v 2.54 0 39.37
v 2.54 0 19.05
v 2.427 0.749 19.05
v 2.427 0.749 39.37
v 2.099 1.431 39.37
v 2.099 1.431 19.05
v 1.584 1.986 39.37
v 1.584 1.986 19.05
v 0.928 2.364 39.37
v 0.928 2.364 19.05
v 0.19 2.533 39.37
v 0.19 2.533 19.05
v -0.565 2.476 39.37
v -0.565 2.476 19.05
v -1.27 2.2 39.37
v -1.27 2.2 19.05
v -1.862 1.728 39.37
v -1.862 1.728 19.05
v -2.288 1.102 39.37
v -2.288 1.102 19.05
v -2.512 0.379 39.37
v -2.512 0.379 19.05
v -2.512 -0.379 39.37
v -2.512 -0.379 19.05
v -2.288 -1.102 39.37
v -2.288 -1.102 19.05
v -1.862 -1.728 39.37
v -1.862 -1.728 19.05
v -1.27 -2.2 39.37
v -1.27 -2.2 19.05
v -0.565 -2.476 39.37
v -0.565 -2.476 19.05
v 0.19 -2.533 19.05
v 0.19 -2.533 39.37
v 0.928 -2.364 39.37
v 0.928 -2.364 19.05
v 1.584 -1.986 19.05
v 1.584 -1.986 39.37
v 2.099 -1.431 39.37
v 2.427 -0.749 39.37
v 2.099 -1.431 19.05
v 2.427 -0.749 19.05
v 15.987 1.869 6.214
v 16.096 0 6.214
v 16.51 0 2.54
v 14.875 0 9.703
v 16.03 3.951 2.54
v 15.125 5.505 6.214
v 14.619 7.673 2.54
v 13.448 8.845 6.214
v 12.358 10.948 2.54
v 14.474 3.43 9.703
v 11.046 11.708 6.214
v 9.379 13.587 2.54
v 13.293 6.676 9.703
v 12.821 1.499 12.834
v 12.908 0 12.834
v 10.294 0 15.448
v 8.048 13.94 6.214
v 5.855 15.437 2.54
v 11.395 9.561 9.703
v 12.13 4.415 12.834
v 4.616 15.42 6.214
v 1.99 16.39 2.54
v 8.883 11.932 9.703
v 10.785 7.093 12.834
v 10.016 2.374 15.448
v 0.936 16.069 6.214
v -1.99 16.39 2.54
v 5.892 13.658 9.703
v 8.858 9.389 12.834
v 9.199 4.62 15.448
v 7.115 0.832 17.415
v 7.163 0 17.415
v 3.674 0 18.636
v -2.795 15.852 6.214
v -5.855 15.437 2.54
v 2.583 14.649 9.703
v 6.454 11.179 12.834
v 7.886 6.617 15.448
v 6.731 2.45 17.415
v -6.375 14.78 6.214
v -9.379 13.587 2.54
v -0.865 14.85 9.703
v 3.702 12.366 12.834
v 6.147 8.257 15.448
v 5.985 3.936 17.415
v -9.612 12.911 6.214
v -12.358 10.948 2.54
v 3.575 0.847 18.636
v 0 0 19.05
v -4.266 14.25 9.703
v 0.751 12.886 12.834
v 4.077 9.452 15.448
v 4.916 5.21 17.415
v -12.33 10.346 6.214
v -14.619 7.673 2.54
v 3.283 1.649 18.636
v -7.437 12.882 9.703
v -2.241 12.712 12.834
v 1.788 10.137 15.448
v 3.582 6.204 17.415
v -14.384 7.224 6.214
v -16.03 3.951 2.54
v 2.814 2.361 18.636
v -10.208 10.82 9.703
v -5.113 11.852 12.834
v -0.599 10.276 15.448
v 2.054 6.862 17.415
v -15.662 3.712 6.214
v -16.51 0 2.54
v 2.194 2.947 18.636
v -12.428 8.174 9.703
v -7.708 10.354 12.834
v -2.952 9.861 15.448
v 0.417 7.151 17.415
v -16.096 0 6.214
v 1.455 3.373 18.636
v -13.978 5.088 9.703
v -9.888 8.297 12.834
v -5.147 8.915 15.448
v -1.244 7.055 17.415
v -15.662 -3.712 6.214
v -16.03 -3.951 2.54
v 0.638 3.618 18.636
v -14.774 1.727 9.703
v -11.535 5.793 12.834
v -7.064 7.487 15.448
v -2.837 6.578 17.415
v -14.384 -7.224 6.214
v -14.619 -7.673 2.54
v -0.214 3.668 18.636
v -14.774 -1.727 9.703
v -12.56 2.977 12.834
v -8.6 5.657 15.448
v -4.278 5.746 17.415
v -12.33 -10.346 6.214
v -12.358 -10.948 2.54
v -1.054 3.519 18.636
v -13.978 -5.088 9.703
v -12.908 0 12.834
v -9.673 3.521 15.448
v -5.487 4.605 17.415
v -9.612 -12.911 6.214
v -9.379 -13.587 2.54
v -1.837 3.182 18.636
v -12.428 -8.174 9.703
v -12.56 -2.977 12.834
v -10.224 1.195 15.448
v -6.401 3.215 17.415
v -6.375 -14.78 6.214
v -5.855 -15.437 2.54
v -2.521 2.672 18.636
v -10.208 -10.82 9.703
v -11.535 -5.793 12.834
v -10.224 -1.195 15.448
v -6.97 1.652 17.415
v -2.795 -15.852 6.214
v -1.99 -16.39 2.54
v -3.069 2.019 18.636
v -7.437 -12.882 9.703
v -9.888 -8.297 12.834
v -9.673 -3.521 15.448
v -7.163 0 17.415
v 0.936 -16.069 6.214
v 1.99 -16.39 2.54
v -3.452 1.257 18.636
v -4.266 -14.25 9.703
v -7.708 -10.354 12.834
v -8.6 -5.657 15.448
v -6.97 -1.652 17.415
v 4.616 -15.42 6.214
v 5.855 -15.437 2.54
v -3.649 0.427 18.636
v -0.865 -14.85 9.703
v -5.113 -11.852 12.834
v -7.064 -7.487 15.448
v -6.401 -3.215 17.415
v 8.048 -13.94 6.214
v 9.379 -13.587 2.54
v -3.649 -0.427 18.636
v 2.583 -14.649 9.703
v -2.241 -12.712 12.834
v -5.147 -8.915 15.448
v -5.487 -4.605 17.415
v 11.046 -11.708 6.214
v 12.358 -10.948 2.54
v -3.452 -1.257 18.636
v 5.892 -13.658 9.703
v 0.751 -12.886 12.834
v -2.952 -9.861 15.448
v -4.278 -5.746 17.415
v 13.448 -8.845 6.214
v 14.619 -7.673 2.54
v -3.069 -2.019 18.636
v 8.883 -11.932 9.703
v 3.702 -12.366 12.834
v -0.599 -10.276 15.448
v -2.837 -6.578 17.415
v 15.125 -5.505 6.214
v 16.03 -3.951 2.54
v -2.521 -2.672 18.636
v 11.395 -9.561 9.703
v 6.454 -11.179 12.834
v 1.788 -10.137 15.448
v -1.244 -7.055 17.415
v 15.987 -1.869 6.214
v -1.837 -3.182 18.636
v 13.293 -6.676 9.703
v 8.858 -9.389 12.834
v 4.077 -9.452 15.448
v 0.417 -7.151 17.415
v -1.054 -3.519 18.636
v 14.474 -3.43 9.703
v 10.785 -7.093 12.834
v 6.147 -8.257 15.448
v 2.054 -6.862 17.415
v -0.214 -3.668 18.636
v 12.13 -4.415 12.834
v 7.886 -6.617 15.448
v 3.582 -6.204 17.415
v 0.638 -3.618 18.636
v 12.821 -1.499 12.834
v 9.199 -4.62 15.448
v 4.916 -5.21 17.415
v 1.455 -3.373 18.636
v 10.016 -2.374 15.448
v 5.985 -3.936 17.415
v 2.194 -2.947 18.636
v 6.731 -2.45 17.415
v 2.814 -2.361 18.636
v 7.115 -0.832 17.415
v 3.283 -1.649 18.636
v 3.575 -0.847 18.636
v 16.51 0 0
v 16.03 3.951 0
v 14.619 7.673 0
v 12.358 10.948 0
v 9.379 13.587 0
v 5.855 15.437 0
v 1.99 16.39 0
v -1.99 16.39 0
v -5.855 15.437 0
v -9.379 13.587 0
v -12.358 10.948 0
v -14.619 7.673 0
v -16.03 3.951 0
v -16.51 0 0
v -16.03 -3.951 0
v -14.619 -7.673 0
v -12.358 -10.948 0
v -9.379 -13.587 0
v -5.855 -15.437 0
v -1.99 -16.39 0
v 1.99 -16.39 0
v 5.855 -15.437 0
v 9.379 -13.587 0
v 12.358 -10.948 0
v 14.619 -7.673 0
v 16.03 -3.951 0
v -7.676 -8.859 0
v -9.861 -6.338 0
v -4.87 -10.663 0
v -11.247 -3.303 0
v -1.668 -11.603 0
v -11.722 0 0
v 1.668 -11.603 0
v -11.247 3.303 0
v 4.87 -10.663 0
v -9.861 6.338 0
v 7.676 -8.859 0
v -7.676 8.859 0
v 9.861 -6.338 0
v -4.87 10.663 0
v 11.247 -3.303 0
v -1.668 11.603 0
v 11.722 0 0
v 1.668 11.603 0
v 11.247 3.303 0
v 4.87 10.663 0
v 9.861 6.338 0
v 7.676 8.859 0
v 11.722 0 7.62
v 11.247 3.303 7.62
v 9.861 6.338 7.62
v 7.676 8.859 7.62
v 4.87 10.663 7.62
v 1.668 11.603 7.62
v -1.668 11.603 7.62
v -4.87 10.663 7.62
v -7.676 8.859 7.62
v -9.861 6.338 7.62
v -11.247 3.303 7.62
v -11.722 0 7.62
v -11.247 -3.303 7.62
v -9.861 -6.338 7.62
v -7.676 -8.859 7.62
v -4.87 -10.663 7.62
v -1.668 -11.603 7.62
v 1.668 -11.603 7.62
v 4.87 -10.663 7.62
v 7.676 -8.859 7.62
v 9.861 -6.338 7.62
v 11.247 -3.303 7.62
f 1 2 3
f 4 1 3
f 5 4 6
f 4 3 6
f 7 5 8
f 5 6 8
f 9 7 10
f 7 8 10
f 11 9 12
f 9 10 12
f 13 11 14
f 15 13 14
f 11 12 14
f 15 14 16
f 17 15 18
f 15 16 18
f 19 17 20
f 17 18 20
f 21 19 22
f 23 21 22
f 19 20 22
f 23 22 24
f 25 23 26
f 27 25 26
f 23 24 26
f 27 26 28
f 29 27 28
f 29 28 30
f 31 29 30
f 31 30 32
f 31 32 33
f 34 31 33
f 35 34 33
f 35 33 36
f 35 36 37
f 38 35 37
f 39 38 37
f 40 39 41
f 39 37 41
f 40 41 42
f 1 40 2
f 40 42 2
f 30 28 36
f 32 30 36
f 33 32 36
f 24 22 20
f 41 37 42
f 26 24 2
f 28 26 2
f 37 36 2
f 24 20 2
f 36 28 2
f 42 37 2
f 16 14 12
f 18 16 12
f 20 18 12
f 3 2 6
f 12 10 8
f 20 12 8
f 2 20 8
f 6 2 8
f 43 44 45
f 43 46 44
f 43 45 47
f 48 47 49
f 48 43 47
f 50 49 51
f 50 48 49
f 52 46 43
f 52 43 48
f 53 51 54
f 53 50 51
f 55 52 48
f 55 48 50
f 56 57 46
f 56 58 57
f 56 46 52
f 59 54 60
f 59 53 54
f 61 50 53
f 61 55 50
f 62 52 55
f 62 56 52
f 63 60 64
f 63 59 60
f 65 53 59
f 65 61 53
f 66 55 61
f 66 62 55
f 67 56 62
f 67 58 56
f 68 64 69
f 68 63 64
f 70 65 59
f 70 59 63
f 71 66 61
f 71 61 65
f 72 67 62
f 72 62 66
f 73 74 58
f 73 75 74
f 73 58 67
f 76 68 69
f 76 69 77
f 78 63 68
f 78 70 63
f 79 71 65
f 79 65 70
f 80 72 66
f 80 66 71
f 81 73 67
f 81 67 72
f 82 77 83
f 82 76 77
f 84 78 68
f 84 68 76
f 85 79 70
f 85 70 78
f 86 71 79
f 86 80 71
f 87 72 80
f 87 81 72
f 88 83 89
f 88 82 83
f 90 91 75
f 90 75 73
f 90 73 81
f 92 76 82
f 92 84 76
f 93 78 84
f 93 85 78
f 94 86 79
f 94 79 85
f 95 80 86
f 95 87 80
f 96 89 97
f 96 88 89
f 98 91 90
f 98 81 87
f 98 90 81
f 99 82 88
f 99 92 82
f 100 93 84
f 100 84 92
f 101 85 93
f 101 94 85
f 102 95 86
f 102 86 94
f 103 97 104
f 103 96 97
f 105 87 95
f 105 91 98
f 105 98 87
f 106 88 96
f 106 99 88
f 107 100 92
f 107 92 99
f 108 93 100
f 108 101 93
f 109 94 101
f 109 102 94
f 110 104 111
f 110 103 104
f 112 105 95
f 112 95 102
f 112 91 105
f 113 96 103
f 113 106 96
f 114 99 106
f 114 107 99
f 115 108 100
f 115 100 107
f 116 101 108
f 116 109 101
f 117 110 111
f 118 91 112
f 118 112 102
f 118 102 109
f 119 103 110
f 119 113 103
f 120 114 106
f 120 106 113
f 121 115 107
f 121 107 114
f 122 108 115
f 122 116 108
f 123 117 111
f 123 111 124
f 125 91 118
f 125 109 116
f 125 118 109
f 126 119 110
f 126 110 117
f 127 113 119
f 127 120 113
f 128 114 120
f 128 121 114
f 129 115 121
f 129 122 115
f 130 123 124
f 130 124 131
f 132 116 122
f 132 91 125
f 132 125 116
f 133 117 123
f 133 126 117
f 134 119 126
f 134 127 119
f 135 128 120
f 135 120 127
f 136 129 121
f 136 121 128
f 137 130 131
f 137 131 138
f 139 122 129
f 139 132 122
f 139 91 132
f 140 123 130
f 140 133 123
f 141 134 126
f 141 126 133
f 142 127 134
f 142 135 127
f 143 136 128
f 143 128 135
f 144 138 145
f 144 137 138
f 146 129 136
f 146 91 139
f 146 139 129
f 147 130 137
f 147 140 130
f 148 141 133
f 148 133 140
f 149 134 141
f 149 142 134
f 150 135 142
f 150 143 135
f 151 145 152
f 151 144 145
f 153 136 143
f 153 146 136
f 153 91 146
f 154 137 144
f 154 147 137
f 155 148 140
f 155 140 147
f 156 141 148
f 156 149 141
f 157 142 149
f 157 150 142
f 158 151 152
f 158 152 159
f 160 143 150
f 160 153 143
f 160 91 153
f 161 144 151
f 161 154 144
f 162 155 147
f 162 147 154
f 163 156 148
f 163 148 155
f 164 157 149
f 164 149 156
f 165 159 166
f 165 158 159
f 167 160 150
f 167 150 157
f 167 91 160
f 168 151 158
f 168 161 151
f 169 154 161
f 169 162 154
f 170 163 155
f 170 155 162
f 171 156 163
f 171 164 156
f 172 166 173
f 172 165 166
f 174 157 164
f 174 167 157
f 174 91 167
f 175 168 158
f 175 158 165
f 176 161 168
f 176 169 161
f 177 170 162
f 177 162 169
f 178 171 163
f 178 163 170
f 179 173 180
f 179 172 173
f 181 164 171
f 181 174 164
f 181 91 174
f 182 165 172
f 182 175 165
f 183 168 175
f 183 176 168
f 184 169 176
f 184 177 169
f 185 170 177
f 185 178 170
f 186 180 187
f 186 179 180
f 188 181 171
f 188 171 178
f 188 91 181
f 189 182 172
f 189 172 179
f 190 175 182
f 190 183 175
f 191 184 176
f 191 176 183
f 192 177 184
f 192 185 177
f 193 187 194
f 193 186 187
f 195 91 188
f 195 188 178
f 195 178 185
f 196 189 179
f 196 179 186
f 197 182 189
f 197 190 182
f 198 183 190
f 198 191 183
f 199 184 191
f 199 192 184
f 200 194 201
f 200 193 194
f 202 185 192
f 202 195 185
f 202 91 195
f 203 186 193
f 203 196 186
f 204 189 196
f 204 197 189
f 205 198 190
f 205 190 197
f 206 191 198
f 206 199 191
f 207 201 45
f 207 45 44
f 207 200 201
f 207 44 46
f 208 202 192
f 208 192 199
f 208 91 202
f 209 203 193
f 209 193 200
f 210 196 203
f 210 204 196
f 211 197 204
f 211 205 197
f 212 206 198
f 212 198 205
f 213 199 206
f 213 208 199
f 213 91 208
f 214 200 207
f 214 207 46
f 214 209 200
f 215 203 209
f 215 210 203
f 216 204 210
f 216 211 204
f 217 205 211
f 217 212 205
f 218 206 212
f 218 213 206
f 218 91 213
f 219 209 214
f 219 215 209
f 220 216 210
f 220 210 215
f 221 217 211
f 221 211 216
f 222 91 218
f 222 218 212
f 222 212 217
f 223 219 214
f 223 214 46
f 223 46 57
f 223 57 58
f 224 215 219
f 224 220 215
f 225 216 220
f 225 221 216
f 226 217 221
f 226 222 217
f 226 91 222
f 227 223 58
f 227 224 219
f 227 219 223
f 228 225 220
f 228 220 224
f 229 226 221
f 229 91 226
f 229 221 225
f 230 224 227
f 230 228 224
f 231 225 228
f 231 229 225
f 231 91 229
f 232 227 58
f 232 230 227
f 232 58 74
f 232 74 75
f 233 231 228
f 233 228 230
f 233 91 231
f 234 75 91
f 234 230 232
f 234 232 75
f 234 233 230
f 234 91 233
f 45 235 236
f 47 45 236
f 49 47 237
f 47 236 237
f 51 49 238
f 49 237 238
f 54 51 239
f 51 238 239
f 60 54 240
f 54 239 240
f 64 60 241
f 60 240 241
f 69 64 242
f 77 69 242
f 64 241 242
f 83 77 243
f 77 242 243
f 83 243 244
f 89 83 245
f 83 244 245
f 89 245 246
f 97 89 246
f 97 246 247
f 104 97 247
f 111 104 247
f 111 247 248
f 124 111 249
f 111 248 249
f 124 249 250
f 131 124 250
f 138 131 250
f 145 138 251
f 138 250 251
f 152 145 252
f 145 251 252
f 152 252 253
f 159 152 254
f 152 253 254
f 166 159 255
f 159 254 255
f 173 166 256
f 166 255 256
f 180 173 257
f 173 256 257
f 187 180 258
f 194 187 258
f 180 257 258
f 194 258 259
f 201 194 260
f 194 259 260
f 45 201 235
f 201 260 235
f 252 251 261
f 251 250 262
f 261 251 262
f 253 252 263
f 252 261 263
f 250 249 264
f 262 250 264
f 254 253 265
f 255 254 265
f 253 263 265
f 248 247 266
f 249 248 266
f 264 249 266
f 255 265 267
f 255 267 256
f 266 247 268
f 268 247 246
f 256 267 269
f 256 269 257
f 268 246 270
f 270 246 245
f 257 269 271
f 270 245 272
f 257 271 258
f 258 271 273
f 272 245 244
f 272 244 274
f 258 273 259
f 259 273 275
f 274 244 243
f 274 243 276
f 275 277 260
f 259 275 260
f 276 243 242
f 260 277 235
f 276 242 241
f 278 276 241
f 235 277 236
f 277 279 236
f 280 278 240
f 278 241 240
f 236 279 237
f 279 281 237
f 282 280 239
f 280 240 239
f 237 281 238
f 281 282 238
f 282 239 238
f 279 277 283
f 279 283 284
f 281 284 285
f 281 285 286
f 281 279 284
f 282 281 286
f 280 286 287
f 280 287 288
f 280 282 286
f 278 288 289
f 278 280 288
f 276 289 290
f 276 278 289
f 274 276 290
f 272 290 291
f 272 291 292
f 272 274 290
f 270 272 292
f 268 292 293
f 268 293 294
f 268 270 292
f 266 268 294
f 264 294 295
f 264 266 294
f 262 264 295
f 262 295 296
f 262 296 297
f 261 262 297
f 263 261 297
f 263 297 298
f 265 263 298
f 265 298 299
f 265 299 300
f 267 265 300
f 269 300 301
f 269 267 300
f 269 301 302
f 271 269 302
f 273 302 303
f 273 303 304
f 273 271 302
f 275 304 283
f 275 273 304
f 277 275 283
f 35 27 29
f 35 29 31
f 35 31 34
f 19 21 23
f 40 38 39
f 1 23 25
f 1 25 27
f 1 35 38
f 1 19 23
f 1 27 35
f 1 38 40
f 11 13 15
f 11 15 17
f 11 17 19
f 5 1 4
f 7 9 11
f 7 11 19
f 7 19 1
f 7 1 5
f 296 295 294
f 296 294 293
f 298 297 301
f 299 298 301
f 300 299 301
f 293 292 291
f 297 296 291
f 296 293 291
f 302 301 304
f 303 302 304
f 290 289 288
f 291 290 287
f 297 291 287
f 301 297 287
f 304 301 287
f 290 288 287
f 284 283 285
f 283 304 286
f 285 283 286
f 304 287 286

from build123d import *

# Parameters (mm, degrees)
F0_R     = 16.51
F1_DEPTH = 19.05
F2_R     = 16.51
F3_R     = 11.722299
F4_DEPTH = 7.62
F6_R     = 2.54
F7_DEPTH = 20.32


with BuildPart() as f1:
    # F0 (on Top) → F1 (new body)
    with BuildSketch(Plane.XY):
        Circle(F0_R)
    extrude(amount=F1_DEPTH)

    # F2
    f2_edges = [f1.edges().sort_by_distance(p)[0] for p in [
        (-16.51, 0, 19.05),
    ]]
    fillet(f2_edges, radius=F2_R)

    # F3 (on Top) → F4 (cut)
    with BuildSketch(Plane.XY):
        Circle(F3_R)
    extrude(amount=F4_DEPTH, mode=Mode.SUBTRACT)

    # F6 (on offset) → F7 (join)
    with BuildSketch(Plane.XY.offset(19.05)):
        Circle(F6_R)
    extrude(amount=F7_DEPTH)


solid = f1.part
